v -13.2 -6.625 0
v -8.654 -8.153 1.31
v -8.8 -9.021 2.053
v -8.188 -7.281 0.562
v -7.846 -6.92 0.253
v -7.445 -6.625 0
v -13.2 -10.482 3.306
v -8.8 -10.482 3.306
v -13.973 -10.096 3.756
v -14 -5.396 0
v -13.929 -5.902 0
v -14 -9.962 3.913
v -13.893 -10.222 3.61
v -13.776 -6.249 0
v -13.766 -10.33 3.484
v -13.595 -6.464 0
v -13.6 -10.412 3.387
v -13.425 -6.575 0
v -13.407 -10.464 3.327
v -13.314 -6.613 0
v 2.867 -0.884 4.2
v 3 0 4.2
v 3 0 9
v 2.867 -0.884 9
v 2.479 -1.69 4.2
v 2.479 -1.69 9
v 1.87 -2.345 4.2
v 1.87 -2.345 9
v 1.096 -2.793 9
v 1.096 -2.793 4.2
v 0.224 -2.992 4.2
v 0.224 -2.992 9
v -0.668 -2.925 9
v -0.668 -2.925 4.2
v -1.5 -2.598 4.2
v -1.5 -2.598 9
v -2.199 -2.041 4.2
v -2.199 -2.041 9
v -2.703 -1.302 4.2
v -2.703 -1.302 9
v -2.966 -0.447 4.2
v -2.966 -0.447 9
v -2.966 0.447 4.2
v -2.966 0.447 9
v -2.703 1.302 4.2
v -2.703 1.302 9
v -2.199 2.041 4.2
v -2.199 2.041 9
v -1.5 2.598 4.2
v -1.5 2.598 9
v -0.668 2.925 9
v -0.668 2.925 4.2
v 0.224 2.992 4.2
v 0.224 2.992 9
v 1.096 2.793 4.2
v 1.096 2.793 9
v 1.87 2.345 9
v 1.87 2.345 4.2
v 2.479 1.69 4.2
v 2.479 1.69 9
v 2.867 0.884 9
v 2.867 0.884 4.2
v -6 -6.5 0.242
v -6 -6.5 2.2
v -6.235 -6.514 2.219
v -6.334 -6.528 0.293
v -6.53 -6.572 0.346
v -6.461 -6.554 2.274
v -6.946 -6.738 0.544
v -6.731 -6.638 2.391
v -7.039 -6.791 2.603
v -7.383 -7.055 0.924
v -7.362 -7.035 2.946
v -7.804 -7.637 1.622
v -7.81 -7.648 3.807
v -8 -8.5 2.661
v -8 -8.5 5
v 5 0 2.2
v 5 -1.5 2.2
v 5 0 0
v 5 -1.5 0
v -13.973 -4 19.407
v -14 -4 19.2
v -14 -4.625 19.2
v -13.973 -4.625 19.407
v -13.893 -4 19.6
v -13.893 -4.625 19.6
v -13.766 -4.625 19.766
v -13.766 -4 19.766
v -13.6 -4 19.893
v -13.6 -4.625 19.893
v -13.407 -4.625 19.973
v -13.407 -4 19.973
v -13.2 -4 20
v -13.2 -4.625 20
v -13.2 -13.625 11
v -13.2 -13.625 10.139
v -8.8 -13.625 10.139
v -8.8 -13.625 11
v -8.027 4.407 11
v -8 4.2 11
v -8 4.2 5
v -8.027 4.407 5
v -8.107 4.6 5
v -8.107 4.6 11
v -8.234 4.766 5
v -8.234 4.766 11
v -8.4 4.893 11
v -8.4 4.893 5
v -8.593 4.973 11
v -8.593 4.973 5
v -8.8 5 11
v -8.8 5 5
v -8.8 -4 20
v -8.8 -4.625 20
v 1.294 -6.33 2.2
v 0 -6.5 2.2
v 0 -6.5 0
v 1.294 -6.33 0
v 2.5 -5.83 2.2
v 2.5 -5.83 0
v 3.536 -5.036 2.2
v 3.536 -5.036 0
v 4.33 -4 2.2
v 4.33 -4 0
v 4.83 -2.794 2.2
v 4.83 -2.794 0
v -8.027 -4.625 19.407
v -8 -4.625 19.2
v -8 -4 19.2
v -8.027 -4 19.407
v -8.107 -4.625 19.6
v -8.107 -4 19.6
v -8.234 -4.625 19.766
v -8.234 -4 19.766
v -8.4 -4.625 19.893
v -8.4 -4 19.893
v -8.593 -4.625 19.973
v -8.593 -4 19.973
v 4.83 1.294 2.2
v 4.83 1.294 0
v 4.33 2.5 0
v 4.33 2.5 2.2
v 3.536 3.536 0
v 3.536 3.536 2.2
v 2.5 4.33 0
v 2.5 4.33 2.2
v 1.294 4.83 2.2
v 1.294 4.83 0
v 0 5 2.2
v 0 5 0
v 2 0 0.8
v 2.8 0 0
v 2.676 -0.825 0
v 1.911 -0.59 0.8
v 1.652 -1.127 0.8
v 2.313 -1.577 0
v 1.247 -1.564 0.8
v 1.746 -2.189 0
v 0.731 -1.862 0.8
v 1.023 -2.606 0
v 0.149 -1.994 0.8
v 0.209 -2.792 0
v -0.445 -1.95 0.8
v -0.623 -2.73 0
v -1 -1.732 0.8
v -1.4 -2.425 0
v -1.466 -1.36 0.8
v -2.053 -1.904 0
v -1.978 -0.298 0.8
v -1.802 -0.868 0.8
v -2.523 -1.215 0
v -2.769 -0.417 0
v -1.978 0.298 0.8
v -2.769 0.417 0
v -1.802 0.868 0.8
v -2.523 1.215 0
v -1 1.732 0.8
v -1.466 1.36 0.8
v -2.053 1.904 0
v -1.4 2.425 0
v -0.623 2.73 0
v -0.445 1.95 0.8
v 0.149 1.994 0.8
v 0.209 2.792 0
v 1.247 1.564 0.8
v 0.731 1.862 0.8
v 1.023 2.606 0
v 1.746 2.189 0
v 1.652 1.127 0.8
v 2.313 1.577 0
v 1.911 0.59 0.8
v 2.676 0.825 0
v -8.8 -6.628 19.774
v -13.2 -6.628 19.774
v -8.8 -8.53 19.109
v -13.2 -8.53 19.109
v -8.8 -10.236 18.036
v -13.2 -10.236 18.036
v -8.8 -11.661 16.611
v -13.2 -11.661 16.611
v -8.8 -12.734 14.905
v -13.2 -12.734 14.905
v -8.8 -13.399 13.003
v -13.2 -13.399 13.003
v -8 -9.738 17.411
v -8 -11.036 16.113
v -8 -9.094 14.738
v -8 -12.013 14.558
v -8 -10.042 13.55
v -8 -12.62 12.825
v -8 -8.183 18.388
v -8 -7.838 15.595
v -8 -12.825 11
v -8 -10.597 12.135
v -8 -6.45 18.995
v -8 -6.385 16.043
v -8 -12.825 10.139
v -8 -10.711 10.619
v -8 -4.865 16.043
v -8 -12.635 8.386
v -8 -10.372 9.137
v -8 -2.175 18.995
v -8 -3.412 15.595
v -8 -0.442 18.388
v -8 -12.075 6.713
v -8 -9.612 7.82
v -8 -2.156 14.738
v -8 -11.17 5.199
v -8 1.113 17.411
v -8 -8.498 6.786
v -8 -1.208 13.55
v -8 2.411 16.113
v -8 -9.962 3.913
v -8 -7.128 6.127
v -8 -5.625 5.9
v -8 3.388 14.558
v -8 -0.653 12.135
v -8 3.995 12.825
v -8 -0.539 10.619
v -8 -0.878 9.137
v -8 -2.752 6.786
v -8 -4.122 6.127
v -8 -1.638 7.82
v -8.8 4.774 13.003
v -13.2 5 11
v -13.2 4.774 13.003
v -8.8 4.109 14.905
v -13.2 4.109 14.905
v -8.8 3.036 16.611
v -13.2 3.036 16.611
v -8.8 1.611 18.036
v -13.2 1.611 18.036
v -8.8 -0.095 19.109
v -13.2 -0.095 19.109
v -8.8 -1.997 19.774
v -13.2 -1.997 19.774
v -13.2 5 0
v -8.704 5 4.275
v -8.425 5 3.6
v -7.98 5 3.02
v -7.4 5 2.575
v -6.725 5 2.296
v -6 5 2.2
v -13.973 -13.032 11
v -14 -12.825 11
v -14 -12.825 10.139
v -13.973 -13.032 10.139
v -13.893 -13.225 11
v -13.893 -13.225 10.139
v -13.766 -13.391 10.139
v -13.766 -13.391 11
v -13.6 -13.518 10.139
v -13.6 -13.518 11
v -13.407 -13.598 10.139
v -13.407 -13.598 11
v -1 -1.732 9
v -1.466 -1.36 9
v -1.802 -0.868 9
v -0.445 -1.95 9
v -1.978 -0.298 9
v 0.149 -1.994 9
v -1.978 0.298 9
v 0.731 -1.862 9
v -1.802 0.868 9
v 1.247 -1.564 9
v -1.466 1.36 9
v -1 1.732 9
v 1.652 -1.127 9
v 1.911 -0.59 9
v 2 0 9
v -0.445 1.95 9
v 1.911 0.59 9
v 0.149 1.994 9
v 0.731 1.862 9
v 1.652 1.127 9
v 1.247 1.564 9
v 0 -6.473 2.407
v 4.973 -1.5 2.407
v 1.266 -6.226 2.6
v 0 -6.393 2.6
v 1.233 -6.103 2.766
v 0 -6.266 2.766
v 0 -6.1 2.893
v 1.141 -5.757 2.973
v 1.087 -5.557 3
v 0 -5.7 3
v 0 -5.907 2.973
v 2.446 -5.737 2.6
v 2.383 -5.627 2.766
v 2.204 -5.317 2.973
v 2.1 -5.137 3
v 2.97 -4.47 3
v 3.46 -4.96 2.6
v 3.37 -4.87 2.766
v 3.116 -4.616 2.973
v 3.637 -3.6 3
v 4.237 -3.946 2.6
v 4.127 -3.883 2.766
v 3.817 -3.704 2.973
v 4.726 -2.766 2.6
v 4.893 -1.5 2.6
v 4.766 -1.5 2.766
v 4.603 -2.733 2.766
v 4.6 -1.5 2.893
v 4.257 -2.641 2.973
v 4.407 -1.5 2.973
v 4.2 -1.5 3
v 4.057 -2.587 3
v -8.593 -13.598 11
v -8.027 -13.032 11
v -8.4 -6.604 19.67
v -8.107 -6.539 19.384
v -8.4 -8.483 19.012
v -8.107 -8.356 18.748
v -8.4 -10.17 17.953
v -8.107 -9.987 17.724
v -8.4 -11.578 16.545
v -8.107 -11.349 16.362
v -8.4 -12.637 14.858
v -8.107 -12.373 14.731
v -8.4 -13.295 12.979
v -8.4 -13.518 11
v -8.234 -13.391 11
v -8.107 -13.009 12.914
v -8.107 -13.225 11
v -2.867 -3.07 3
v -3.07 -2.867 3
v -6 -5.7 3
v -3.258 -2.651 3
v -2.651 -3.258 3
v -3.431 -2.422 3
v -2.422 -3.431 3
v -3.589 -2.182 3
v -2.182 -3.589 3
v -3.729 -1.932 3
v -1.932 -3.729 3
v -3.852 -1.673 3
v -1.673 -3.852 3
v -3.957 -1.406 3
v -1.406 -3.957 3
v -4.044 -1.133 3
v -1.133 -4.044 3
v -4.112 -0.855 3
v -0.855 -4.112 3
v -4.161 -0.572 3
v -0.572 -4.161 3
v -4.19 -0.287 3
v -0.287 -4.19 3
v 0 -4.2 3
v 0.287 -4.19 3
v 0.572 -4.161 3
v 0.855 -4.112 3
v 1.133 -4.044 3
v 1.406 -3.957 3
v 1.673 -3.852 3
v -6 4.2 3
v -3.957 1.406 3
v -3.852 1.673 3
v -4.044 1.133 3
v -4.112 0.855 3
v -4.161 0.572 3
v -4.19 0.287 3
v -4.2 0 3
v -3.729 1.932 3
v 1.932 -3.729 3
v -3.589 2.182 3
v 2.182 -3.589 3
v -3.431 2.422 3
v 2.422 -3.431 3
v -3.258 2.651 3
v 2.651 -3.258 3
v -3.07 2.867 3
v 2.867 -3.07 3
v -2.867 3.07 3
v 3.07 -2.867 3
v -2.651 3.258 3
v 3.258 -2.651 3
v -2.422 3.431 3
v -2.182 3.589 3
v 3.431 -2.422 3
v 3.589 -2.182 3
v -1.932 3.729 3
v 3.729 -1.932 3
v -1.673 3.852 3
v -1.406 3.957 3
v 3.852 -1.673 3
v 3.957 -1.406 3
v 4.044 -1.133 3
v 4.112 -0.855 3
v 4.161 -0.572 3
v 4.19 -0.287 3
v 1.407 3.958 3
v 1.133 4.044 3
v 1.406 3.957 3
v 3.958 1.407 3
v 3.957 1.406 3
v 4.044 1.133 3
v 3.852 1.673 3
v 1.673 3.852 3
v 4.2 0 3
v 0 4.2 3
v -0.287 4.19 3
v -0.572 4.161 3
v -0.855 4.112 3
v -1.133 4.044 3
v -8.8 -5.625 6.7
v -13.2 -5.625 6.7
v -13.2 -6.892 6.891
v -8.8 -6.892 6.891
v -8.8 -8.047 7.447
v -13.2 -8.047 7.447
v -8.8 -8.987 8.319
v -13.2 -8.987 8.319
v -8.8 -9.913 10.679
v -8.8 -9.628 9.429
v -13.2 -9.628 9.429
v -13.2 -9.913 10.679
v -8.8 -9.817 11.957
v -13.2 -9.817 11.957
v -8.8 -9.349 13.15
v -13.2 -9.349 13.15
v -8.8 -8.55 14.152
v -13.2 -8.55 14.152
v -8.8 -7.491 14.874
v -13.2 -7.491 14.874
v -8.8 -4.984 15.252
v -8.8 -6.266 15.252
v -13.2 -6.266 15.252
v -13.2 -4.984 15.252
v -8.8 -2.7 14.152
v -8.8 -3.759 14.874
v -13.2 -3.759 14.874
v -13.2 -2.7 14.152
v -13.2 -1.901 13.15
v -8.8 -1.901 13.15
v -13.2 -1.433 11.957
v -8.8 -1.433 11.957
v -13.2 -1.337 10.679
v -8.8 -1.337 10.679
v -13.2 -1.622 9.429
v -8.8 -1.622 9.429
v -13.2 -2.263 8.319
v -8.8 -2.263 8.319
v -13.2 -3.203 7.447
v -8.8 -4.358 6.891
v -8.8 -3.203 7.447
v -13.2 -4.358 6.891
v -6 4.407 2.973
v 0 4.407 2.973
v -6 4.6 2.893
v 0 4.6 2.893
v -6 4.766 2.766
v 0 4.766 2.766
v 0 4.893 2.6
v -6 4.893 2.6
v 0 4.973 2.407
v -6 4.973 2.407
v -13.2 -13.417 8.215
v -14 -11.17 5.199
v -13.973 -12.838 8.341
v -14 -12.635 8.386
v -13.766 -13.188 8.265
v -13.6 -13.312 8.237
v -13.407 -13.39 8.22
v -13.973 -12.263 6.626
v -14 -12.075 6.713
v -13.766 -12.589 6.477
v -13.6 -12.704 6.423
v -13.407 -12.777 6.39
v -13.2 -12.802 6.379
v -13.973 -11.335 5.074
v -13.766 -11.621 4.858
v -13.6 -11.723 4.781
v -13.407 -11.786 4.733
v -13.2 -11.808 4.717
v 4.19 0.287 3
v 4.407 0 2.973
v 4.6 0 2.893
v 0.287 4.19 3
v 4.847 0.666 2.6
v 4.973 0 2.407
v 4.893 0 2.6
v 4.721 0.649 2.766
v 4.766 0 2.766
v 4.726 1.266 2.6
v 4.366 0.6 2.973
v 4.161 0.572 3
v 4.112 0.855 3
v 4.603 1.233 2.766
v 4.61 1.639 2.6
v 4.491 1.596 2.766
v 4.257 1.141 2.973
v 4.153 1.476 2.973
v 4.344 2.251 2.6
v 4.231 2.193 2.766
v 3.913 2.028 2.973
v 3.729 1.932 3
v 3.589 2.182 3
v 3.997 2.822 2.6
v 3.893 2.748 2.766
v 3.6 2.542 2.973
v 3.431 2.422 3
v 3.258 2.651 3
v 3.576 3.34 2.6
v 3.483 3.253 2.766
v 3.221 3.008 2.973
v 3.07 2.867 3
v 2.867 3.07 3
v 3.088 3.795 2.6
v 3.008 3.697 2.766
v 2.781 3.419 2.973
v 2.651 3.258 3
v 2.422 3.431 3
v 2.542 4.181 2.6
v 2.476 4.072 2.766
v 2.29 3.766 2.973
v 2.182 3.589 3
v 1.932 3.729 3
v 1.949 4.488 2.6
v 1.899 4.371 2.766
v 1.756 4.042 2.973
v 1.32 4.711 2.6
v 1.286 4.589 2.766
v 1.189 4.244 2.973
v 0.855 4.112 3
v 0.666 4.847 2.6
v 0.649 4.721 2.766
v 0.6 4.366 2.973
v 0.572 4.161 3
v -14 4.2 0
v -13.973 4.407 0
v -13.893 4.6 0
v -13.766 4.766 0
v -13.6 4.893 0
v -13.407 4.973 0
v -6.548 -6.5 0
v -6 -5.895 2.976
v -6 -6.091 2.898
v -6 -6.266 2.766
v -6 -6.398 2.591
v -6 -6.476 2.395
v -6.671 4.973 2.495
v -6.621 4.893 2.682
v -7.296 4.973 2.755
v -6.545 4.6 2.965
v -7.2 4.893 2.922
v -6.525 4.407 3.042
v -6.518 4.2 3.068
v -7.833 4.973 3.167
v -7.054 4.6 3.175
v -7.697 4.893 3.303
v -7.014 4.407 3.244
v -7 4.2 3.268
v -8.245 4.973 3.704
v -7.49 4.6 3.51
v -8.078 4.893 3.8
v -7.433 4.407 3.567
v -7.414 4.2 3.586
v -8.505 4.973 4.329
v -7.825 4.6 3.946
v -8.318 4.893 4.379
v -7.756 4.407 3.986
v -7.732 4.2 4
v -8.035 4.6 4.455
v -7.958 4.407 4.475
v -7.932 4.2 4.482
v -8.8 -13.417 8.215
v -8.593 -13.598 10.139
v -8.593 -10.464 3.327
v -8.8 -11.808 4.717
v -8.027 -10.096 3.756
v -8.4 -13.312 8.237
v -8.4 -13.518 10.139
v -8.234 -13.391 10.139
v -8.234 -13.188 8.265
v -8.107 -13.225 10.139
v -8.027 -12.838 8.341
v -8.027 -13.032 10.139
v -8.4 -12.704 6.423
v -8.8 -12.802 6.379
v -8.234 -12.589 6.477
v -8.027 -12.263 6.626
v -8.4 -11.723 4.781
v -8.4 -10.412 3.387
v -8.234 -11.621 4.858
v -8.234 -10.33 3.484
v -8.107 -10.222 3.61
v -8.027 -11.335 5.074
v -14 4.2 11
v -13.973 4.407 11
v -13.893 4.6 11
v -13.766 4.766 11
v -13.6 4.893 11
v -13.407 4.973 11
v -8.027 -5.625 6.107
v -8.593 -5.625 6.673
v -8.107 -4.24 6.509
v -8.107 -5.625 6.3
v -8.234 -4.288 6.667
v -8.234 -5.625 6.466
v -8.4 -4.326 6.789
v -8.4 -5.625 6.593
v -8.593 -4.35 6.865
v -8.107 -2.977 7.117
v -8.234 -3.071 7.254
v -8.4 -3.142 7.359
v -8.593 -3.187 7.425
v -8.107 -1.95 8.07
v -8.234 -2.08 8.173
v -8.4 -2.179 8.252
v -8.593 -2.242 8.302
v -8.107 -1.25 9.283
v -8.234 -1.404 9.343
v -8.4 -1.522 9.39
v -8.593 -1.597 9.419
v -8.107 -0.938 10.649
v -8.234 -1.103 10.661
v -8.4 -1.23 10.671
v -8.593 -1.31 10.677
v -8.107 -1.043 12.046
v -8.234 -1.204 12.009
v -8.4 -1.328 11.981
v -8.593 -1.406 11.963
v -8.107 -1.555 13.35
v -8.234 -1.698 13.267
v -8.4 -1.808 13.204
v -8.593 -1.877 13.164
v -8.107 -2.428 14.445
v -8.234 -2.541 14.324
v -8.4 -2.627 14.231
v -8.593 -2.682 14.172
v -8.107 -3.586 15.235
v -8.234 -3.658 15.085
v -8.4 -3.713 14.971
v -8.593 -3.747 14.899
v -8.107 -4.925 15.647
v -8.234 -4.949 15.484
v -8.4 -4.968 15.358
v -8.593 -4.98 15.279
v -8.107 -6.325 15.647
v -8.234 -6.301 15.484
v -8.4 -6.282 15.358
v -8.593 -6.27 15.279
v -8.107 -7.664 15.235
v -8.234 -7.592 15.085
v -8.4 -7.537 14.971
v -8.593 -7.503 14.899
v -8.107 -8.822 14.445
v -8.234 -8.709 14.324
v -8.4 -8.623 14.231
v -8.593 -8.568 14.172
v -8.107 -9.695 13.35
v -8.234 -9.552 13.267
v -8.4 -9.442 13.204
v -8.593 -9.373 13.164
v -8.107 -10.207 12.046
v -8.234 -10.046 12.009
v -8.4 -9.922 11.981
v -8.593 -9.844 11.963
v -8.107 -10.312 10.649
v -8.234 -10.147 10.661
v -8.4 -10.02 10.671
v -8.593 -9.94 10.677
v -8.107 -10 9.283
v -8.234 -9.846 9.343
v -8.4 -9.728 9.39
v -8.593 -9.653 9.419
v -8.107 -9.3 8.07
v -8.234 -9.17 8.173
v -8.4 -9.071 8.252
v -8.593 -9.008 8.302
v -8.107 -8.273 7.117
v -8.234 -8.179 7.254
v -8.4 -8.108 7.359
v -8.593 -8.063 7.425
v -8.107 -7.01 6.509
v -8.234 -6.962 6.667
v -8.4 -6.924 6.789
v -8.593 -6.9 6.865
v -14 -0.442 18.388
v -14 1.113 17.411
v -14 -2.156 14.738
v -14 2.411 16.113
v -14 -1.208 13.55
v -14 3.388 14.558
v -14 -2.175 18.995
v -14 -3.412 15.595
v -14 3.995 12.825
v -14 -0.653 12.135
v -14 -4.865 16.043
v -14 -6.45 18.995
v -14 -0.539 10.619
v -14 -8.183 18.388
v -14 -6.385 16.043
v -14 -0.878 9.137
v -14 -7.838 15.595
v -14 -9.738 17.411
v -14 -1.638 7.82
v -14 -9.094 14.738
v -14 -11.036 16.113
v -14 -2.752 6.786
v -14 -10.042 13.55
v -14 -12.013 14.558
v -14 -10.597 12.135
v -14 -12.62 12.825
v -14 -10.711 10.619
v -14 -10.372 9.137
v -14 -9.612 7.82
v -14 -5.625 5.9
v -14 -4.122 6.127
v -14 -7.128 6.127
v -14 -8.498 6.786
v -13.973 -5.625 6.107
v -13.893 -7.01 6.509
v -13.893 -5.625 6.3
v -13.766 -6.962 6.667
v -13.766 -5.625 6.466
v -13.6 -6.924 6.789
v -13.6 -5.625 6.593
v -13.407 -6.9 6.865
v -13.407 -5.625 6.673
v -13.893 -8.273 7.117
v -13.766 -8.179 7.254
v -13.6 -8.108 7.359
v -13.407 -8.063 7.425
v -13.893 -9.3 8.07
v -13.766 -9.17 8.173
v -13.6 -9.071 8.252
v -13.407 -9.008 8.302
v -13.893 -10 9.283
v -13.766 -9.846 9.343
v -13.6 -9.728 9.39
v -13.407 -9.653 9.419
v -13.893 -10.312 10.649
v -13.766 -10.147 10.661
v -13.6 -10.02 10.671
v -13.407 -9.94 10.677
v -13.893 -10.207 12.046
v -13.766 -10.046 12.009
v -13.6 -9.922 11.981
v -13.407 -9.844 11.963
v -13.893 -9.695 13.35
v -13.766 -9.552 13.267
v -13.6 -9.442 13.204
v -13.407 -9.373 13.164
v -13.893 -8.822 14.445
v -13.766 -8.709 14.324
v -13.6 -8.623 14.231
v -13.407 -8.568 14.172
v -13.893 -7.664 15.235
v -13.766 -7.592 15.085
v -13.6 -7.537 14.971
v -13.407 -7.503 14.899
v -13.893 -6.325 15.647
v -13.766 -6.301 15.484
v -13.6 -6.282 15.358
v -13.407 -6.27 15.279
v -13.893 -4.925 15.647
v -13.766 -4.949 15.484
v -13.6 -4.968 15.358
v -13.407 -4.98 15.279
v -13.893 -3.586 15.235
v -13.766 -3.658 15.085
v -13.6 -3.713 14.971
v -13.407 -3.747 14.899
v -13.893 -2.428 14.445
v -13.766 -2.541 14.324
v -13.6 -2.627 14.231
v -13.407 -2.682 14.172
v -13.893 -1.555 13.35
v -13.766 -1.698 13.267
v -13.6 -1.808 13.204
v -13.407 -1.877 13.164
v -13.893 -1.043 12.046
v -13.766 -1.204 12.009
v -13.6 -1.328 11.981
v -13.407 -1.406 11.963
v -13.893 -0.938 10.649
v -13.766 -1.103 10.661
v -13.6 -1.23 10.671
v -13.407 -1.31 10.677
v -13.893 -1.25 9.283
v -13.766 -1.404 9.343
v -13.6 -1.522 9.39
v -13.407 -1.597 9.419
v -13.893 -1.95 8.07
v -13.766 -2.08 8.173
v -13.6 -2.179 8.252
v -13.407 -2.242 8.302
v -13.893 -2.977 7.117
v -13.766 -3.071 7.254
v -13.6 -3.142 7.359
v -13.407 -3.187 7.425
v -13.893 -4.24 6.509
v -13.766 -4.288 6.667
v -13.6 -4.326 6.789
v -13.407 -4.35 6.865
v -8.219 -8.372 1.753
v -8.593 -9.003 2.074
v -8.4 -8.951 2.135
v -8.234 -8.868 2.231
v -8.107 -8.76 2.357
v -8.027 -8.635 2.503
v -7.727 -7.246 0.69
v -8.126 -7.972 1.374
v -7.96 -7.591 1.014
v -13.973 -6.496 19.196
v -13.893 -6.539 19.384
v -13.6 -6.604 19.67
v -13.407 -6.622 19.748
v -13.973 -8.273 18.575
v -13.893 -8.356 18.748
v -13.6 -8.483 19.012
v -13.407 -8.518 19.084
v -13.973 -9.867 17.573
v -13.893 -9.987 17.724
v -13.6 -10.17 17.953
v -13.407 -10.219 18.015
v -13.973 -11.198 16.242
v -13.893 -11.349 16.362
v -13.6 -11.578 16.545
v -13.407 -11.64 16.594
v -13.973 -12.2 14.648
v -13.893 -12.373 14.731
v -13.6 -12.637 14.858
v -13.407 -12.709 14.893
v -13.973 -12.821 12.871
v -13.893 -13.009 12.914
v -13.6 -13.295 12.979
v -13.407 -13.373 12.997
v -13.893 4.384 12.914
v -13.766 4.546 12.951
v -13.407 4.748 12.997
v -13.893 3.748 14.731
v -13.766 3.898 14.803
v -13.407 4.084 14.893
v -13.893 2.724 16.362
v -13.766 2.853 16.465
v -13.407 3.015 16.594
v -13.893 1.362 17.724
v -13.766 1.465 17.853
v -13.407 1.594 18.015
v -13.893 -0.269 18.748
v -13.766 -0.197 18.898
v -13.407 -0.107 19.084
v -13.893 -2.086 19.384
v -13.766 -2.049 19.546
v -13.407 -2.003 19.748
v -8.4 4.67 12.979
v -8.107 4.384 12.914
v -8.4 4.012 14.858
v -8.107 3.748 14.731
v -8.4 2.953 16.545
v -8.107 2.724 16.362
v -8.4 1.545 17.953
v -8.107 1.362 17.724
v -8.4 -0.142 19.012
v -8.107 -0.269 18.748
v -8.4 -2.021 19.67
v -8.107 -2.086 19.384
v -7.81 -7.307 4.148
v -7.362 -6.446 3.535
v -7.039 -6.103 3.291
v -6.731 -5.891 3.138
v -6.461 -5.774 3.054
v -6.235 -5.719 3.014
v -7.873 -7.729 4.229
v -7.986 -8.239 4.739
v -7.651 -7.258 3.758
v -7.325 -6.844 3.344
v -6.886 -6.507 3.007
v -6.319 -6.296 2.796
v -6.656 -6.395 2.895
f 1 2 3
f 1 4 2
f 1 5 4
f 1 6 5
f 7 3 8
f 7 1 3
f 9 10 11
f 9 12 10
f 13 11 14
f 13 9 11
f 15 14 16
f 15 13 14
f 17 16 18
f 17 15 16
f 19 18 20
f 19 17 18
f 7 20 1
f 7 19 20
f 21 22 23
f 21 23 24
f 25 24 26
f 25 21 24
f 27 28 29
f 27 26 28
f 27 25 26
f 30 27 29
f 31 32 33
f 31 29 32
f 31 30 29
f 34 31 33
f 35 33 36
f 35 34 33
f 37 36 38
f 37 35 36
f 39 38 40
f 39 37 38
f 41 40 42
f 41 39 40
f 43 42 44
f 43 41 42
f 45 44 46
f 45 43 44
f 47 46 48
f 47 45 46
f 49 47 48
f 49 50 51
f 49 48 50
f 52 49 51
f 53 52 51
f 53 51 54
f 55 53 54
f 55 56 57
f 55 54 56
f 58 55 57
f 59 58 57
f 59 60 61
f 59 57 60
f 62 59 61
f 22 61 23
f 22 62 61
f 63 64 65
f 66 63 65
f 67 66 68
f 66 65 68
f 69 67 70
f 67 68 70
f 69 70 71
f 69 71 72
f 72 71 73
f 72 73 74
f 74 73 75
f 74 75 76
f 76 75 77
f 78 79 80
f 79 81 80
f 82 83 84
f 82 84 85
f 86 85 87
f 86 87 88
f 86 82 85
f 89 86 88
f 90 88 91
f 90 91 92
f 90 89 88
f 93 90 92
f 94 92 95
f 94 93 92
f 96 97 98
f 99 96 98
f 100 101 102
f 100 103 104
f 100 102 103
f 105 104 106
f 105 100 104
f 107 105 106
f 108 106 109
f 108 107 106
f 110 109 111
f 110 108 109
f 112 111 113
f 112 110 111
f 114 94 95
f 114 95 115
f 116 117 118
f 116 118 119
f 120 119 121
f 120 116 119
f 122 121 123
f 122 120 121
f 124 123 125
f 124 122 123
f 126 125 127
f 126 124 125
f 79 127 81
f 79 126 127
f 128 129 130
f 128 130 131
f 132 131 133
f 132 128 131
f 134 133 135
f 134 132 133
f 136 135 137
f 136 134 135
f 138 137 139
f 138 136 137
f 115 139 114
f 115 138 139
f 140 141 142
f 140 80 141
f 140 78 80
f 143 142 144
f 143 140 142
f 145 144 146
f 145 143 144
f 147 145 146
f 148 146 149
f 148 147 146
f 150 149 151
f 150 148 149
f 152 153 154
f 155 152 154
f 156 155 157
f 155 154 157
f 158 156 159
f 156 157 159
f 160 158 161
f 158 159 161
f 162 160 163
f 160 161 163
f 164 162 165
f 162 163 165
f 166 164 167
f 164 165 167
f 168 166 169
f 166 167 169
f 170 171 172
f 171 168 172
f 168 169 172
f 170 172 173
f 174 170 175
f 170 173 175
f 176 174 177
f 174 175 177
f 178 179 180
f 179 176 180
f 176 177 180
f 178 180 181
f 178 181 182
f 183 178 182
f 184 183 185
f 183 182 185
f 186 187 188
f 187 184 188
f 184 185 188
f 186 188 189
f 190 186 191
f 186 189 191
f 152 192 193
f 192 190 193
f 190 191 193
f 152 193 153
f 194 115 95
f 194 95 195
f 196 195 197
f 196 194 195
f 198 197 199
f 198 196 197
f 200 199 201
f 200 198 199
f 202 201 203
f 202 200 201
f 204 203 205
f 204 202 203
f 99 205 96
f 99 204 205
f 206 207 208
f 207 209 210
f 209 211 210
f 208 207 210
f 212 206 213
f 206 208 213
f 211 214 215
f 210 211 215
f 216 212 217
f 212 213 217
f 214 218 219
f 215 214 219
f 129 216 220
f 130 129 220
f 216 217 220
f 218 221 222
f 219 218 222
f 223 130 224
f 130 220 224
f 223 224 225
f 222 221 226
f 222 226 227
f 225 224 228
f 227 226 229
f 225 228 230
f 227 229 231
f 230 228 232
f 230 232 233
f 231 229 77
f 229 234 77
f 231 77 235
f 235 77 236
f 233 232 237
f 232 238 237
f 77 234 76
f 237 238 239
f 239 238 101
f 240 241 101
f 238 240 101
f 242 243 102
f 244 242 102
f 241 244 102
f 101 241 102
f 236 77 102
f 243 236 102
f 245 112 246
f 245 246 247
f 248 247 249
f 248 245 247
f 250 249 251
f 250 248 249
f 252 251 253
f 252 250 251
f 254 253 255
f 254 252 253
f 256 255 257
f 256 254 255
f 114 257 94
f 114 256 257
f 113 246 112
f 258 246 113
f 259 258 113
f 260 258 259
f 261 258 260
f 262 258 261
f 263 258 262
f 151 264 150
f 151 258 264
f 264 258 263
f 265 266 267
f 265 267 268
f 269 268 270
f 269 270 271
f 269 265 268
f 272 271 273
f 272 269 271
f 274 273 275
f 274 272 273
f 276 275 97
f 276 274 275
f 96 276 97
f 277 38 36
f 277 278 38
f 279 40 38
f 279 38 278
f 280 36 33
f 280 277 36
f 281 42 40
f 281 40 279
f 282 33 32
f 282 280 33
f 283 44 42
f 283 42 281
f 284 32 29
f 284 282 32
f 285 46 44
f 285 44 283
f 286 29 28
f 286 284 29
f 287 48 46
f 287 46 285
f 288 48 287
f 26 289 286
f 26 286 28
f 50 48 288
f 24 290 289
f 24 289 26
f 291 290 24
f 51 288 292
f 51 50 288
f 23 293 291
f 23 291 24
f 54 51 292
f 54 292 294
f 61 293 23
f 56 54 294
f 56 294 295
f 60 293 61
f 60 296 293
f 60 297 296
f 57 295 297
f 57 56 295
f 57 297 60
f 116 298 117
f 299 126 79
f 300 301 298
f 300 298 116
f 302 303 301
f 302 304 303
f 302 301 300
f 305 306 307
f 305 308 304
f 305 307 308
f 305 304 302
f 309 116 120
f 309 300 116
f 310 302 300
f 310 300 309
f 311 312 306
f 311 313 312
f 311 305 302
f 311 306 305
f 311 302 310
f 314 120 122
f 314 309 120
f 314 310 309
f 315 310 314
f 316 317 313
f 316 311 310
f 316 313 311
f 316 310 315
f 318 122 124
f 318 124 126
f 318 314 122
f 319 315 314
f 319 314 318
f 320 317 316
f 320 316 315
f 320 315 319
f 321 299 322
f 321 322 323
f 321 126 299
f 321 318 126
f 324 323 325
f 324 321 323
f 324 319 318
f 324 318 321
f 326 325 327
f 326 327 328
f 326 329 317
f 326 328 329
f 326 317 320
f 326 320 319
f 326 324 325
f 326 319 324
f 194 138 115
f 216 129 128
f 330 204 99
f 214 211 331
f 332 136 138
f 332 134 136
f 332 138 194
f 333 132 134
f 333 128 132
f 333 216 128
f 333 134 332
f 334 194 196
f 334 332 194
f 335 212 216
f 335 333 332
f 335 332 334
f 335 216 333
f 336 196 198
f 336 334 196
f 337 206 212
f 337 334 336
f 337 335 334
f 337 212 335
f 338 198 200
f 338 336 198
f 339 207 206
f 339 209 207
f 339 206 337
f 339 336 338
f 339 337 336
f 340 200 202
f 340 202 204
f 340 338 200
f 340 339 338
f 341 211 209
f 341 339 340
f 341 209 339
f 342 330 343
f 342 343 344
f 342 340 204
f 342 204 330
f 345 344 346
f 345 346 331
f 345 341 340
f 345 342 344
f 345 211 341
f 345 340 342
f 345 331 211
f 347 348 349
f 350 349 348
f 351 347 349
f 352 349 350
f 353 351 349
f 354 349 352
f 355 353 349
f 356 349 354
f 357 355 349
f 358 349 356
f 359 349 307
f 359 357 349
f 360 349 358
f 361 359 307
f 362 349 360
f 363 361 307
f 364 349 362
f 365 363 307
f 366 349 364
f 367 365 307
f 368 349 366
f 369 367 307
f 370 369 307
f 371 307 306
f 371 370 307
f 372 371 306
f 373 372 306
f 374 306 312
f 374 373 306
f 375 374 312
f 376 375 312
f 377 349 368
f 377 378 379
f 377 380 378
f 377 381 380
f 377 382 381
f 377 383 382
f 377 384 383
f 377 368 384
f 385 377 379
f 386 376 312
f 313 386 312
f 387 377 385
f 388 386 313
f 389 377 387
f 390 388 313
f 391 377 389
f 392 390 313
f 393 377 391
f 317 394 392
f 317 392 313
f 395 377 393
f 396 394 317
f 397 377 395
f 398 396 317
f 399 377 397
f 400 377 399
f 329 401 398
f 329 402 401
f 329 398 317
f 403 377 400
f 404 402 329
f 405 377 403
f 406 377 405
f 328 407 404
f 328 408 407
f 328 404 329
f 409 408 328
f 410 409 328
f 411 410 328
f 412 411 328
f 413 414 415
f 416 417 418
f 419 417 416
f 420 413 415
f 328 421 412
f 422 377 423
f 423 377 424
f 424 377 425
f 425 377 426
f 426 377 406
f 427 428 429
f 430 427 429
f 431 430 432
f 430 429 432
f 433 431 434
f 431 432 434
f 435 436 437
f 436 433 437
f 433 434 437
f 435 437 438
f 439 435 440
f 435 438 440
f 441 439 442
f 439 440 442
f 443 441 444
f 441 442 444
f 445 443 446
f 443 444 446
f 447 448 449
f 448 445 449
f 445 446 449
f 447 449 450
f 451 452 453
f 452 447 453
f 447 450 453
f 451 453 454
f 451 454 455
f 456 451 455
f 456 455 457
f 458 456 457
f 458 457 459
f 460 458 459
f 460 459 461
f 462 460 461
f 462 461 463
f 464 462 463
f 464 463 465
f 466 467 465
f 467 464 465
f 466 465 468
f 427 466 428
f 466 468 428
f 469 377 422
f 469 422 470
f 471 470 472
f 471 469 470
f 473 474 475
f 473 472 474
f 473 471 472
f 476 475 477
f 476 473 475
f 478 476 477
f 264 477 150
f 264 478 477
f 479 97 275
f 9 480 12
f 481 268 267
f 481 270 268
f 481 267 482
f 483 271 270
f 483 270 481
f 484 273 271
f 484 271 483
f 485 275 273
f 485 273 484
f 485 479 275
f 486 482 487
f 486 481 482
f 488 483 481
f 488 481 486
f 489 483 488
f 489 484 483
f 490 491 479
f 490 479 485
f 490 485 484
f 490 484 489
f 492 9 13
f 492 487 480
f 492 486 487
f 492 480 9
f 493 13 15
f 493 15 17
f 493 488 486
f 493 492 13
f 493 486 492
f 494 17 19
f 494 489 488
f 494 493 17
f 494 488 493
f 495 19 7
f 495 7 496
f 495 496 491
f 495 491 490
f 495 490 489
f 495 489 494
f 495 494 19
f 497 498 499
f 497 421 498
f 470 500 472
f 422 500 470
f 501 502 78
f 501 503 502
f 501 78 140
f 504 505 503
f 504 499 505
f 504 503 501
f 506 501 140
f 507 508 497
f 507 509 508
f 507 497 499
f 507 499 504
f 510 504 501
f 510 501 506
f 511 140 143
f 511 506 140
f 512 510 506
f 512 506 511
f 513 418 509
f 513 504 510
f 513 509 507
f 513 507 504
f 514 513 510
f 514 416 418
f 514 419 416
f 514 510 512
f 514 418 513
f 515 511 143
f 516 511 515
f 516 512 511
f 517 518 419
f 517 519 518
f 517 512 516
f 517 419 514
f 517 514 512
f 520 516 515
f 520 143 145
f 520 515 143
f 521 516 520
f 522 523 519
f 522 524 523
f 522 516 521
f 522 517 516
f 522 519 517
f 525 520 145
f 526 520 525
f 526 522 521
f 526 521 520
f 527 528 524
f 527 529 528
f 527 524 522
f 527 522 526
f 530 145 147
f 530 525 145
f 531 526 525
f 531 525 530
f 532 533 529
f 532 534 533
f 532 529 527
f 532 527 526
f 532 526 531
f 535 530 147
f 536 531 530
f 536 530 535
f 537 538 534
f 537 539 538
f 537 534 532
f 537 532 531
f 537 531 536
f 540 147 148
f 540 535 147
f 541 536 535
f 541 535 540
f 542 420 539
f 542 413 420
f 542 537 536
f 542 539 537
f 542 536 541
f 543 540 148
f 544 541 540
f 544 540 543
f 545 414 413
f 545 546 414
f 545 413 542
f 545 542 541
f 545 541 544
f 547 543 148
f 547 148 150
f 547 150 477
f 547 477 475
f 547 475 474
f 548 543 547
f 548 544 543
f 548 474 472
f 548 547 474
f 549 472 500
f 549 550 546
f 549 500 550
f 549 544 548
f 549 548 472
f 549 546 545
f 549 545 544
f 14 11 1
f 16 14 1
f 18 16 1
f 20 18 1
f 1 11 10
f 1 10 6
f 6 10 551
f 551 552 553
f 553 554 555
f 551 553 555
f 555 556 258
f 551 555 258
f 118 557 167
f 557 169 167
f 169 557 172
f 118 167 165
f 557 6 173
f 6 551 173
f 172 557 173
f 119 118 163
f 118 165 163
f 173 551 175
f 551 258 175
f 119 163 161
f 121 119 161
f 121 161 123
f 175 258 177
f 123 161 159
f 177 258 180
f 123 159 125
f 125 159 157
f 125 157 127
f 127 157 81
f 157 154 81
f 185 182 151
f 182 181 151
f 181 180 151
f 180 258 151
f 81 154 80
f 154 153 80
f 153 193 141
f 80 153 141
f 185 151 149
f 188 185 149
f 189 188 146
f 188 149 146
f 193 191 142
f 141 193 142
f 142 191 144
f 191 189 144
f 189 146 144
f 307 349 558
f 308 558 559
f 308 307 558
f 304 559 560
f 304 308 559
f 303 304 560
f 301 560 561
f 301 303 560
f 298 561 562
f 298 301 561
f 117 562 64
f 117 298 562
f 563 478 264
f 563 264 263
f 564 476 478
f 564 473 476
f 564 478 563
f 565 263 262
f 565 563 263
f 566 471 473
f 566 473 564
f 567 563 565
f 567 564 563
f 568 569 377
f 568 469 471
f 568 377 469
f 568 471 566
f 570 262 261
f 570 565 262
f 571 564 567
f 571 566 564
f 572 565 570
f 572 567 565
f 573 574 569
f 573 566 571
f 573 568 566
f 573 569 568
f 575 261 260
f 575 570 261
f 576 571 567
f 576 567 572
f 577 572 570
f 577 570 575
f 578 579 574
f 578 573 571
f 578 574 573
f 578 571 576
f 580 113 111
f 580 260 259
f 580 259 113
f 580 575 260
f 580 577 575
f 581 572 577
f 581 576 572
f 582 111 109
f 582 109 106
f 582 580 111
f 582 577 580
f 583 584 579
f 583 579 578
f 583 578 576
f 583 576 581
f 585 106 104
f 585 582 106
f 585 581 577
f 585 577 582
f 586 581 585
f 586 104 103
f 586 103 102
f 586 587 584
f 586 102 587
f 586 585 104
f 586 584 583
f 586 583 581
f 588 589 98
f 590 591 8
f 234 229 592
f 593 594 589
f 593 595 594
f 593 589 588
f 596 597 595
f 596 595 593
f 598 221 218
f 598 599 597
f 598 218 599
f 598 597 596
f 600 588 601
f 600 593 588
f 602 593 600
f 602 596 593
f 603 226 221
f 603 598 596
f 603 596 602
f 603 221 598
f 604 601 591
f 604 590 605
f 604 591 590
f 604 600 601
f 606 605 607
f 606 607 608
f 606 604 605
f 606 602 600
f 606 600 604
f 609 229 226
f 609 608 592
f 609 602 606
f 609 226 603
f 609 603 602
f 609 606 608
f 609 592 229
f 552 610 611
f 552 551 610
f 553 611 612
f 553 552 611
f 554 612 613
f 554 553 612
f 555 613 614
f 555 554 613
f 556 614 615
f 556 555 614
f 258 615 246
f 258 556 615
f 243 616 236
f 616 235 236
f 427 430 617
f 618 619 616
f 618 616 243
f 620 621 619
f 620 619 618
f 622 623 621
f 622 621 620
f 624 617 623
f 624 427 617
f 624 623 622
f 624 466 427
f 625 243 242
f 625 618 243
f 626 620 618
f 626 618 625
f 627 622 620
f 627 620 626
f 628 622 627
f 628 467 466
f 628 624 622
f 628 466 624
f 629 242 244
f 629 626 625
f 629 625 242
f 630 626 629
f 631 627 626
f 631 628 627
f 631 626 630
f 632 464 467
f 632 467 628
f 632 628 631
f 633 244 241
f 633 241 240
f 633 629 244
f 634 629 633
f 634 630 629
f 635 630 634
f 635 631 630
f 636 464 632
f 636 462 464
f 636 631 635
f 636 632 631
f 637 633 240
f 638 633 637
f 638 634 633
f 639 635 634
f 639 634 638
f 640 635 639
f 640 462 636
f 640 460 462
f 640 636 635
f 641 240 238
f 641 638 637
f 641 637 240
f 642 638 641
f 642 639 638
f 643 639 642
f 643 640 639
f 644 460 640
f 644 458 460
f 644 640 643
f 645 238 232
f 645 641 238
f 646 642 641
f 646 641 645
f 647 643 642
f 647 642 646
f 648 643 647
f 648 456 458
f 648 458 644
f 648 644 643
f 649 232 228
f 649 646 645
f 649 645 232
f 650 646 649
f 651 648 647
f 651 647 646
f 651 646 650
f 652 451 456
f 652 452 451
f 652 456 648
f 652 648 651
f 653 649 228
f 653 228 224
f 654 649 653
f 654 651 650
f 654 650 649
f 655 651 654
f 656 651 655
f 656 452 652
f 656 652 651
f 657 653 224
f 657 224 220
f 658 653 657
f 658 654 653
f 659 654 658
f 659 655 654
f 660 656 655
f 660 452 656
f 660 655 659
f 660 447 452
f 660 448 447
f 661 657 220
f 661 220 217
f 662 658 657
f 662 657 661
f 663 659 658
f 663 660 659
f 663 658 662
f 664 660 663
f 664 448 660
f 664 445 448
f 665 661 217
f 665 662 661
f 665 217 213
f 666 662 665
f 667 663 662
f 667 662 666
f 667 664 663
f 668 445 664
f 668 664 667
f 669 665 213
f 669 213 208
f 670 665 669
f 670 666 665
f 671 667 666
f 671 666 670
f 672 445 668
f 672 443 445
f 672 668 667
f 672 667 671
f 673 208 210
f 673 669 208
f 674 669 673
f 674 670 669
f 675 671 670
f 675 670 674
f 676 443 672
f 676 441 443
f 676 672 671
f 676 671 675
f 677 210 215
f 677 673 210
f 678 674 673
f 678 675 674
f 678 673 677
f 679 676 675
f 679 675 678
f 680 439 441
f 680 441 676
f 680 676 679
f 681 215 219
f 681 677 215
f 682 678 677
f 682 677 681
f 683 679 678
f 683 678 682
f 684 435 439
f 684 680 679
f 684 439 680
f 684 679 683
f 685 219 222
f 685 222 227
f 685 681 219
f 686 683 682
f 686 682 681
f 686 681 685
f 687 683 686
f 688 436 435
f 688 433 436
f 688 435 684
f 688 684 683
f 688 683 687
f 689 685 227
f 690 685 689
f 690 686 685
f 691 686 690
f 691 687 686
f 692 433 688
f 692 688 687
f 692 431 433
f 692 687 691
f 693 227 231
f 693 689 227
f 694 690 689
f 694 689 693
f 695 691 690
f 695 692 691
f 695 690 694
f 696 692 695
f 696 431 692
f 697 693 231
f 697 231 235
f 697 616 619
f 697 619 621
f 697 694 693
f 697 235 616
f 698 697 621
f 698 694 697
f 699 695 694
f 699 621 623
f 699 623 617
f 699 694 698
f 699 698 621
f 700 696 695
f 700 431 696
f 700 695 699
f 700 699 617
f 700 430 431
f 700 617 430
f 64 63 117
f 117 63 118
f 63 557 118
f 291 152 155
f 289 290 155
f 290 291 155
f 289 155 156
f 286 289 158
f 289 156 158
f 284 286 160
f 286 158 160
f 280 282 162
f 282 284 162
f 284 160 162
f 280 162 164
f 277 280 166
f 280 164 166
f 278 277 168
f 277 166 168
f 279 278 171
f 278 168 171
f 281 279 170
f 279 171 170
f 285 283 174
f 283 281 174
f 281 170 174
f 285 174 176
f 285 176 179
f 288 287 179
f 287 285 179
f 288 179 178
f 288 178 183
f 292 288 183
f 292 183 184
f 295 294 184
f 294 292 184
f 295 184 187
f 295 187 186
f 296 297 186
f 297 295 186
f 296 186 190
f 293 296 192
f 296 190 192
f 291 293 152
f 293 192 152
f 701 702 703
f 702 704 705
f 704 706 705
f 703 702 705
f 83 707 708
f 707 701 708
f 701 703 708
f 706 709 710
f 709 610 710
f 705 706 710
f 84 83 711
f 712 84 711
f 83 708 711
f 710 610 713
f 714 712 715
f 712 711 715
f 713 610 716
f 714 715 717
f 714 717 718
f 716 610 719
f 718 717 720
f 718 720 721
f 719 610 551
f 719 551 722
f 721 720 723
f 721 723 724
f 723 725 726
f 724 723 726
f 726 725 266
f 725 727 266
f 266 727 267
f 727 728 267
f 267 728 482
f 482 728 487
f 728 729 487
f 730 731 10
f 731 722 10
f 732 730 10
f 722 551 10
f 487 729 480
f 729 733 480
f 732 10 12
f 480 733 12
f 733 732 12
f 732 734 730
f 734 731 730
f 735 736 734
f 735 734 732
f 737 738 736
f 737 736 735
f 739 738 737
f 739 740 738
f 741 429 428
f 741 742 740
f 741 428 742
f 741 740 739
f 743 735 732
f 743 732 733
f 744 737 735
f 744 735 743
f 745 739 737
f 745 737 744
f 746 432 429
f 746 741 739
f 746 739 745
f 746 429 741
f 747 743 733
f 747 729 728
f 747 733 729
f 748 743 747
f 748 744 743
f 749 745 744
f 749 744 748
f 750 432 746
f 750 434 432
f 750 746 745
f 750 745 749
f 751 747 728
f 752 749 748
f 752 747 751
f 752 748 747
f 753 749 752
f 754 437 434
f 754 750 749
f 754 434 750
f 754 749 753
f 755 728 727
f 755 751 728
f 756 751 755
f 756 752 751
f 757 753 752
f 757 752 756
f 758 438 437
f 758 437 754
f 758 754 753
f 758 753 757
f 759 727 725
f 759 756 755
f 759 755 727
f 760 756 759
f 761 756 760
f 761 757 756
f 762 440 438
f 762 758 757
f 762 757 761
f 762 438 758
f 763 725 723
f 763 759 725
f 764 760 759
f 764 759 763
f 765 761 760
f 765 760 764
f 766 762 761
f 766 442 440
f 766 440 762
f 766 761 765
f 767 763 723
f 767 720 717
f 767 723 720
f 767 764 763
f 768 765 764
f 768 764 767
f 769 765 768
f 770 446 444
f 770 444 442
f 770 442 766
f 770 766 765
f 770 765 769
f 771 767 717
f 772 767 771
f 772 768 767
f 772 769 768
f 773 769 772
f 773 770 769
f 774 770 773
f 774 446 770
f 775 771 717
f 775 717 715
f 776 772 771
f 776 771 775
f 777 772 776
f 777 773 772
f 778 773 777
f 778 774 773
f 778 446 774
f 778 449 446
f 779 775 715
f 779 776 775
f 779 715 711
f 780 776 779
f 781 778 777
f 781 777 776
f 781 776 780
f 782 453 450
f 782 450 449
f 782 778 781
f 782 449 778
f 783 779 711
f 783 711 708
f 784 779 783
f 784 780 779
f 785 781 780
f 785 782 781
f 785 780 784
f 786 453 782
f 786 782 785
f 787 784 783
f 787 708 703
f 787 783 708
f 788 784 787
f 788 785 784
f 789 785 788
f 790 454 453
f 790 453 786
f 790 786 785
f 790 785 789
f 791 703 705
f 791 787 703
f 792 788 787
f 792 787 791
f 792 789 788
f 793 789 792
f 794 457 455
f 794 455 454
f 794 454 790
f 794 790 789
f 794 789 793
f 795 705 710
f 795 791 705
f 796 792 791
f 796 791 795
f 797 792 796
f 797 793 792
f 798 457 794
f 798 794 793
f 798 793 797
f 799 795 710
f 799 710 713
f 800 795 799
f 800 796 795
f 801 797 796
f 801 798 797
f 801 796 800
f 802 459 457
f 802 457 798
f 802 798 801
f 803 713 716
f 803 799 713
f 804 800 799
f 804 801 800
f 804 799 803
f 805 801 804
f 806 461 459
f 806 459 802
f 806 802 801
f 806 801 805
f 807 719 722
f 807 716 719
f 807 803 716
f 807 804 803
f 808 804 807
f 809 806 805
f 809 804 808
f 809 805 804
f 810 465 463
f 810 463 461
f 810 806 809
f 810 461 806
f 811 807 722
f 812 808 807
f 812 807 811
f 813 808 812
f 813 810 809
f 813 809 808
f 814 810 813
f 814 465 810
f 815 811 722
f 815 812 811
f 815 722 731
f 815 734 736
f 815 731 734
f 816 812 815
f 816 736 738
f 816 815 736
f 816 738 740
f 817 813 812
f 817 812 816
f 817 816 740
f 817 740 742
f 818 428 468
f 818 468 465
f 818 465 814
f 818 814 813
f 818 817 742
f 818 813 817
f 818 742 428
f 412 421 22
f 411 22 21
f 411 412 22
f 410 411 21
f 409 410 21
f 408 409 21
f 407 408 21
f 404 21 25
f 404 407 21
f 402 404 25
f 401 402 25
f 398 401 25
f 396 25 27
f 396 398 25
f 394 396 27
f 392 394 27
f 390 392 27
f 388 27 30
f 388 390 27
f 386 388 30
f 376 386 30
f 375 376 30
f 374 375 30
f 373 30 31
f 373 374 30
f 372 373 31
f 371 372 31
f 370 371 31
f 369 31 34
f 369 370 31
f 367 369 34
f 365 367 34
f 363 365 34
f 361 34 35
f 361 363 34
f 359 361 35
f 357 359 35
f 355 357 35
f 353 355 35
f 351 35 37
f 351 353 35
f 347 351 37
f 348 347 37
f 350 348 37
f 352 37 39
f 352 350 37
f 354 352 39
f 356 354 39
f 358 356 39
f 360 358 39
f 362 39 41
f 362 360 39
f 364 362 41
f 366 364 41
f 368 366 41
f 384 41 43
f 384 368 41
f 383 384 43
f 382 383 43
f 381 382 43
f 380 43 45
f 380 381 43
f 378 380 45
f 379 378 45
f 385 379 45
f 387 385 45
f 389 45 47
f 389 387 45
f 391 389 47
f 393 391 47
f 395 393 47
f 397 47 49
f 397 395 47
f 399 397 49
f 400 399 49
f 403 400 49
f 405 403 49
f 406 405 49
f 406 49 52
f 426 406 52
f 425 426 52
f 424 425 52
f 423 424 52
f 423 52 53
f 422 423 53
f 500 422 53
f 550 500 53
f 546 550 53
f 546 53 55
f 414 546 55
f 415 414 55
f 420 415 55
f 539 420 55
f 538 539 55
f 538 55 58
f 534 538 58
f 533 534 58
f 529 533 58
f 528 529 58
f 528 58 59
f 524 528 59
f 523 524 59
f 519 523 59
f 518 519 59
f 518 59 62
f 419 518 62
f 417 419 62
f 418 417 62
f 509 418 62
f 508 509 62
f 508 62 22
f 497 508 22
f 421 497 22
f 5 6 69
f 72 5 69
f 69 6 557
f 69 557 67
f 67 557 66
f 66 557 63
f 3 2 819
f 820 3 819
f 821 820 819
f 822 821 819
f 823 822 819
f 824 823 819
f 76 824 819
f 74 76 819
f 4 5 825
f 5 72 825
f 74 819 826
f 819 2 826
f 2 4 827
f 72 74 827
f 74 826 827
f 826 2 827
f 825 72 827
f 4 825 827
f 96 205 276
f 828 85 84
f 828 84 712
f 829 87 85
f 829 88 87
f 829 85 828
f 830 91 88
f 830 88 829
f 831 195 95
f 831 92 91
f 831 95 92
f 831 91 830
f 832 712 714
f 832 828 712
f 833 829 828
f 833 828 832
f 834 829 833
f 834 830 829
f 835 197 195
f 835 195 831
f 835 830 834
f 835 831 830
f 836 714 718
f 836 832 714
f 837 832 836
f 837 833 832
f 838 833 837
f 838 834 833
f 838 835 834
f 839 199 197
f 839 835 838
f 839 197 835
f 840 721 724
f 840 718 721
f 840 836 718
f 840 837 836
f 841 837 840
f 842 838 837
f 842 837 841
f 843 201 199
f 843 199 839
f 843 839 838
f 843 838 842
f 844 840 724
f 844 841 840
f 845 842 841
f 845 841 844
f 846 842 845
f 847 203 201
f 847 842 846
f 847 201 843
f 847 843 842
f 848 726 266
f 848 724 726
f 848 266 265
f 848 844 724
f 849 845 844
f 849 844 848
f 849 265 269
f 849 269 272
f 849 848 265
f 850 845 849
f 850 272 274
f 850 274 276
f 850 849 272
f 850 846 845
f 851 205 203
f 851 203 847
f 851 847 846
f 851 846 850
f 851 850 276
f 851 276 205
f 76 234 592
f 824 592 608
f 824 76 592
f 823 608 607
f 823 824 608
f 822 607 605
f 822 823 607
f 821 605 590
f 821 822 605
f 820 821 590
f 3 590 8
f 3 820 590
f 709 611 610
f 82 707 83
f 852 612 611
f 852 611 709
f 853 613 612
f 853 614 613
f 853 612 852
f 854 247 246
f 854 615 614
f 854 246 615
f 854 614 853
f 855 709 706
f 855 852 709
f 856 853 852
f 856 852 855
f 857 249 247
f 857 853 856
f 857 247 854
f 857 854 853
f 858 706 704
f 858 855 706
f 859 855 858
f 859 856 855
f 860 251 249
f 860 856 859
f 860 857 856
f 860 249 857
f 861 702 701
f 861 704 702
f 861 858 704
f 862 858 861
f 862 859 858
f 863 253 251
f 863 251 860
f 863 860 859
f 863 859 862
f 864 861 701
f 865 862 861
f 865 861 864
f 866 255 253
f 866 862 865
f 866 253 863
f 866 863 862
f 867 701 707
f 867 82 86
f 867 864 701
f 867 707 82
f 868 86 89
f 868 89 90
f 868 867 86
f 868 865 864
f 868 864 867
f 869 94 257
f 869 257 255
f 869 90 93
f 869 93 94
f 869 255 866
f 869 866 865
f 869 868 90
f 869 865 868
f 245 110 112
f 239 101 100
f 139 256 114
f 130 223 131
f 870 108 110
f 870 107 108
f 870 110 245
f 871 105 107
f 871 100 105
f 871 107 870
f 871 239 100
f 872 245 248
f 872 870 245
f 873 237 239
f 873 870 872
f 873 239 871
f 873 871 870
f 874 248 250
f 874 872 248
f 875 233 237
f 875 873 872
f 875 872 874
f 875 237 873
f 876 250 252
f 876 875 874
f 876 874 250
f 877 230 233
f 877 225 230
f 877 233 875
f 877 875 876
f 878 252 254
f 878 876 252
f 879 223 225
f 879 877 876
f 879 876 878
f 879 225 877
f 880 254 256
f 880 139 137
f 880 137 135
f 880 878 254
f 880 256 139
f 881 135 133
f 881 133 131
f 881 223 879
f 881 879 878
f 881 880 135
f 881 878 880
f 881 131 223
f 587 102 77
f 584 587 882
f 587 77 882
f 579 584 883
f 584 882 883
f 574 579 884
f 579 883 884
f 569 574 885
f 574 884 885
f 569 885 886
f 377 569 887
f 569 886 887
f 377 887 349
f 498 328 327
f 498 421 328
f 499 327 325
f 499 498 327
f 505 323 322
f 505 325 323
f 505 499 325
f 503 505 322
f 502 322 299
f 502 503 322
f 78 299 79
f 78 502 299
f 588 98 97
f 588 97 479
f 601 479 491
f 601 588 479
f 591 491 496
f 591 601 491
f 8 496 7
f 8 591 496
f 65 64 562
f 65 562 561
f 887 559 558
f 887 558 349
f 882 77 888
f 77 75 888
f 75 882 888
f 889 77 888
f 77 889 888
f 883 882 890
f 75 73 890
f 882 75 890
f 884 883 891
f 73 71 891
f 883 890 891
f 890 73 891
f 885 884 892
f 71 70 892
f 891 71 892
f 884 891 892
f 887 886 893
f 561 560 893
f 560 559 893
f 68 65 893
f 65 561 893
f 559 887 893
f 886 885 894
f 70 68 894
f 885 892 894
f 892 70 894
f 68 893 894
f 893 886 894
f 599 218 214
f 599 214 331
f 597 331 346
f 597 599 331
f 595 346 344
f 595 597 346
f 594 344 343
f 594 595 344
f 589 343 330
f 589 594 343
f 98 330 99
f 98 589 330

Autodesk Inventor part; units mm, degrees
ref_plane "YZ Plane" through (0, 0, 0) normal (1, 0, 0) x (0, 1, 0)
ref_plane "XZ Plane" through (0, 0, 0) normal (0, 1, 0) x (-1, 0, 0)
ref_plane "XY Plane" through (0, 0, 0) normal (0, 0, 1) x (1, 0, 0)
sketch "Эскиз1" plane through (0, 0, 0) normal (0, 0, 1) x (1, 0, 0)
  circle A0 centre (0, 0) radius 2
  circle A1 centre (0, 0) radius 5.625 construction
  line L0 (-14, -9.625) -> (5, -9.625) construction
  line L1 (5, -9.625) -> (5, -1.625) construction
  line L2 (-14, -1.625) -> (-14, -9.625) construction
  line L3 (-14, -5.625) -> (5, -5.625) construction
  line L4 (-14, -13.625) -> (5, -13.625)
  line L5 (5, -13.625) -> (5, 5)
  line L6 (-14, 5) -> (-14, -13.625)
  circle A2 centre (0, 0) radius 6.5 construction
  line L7 (-14, 5) -> (5, 5)
  line L8 (0, -17.65) -> (0, 10.525) construction
  line L9 (-8, 5) -> (-8, -13.625) construction
  line L10 (-18.1, 0) -> (10.6, 0) construction
  line L11 (-8, -13.625) -> (-8, -6.5)
  line L12 (-8, -6.5) -> (5, -6.5)
  dimension "d0" = 4
  dimension "d1" = 11.25
  dimension "d5" = 13
  dimension "d11" = 6
  dimension "d36" = 5
  dimension "d37" = 5
  dimension "d39" = 8
  dimension "d40" = 4
  dimension "d41" = 4
extrude "Выдавливание1" add sketch "Эскиз1" along normal blind 3 contours L6 L7 L5 L12 L11 L4
sketch "Эскиз3" plane through (0, 0, 3) normal (0, 0, 1) x (1, 0, 0)
  line L0 (-14, -13.625) -> (-8, -13.625) projected
  line L1 (-14, 5) -> (-8, 5)
  line L2 (-8, 5) -> (-8, -13.625)
  line L3 (-8, -13.625) -> (-14, -13.625)
  line L4 (-14, -13.625) -> (-14, 5)
  point P0 (0, 0)
  point P1 (5, -13.625)
  point P2 (4, 5)
  dimension "d17" = 6
extrude "Выдавливание3" add sketch "Эскиз3" along normal blind 17
sketch "Эскиз4" plane through (-14, -13.625, 0) normal (1, 0, 0) x (0, 0, -1)
  circle A0 centre (-11, 8) radius 4.3
  line L0 (0, 7.125) -> (0, 18.625) projected
  line L1 (0, 0) -> (-20, 0) projected
  line L2 (-20, 18.625) -> (-20, 0) projected
  line L3 (0, 18.625) -> (0, 0) projected
  line L4 (0, 7) -> (-6, 0)
  point P0 (0, 13.625)
  dimension "d20" = 8.6
  dimension "d42" = 9
  dimension "d48" = 8
  dimension "d49" = 7
  dimension "d50" = 6
extrude "Выдавливание4" cut sketch "Эскиз4" along normal up to surface (6 mm away)
sketch "Эскиз2" plane through (0, 0, 3) normal (0, 0, 1) x (1, 0, 0)
  circle A0 centre (0, 0) radius 3
  circle A1 centre (0, 0) radius 2 projected
  dimension "d14" = 6
extrude "Выдавливание2" add sketch "Эскиз2" along normal blind 6
fillet "Сопряжение1" radius 9 3 edges at (-11, 5, 20) (-11, -13.625, 20) (-11, -13.625, 6)
fillet "Сопряжение1" radius 5 2 edges at (5, 5, 1.5) (5, -6.5, 1.5)
fillet "Сопряжение1" radius 2 2 edges at (-8, -6.5, 1.5) (-8, -0.75, 3)
chamfer "Фаска1" distance 1.2 angle 45 1 edges at (-3, 0, 3)
fillet "Сопряжение2" radius 0.8 9 edges at (-8, -5.625, 15.3) (-14, -5.625, 15.3) (-14, -13.625, 10.5697) (-14, 2.364, 17.364) (-8, 5, 8) (-8, -13.625, 10.5697) (-8, 2.364, 17.364) (-8, -9.4911, 2.4566) (-14, -8.5536, 1.6531)
chamfer "Фаска2" distance 0.8 angle 45 1 edges at (-2, 0, 0)
properties part number "Петля ролика"
